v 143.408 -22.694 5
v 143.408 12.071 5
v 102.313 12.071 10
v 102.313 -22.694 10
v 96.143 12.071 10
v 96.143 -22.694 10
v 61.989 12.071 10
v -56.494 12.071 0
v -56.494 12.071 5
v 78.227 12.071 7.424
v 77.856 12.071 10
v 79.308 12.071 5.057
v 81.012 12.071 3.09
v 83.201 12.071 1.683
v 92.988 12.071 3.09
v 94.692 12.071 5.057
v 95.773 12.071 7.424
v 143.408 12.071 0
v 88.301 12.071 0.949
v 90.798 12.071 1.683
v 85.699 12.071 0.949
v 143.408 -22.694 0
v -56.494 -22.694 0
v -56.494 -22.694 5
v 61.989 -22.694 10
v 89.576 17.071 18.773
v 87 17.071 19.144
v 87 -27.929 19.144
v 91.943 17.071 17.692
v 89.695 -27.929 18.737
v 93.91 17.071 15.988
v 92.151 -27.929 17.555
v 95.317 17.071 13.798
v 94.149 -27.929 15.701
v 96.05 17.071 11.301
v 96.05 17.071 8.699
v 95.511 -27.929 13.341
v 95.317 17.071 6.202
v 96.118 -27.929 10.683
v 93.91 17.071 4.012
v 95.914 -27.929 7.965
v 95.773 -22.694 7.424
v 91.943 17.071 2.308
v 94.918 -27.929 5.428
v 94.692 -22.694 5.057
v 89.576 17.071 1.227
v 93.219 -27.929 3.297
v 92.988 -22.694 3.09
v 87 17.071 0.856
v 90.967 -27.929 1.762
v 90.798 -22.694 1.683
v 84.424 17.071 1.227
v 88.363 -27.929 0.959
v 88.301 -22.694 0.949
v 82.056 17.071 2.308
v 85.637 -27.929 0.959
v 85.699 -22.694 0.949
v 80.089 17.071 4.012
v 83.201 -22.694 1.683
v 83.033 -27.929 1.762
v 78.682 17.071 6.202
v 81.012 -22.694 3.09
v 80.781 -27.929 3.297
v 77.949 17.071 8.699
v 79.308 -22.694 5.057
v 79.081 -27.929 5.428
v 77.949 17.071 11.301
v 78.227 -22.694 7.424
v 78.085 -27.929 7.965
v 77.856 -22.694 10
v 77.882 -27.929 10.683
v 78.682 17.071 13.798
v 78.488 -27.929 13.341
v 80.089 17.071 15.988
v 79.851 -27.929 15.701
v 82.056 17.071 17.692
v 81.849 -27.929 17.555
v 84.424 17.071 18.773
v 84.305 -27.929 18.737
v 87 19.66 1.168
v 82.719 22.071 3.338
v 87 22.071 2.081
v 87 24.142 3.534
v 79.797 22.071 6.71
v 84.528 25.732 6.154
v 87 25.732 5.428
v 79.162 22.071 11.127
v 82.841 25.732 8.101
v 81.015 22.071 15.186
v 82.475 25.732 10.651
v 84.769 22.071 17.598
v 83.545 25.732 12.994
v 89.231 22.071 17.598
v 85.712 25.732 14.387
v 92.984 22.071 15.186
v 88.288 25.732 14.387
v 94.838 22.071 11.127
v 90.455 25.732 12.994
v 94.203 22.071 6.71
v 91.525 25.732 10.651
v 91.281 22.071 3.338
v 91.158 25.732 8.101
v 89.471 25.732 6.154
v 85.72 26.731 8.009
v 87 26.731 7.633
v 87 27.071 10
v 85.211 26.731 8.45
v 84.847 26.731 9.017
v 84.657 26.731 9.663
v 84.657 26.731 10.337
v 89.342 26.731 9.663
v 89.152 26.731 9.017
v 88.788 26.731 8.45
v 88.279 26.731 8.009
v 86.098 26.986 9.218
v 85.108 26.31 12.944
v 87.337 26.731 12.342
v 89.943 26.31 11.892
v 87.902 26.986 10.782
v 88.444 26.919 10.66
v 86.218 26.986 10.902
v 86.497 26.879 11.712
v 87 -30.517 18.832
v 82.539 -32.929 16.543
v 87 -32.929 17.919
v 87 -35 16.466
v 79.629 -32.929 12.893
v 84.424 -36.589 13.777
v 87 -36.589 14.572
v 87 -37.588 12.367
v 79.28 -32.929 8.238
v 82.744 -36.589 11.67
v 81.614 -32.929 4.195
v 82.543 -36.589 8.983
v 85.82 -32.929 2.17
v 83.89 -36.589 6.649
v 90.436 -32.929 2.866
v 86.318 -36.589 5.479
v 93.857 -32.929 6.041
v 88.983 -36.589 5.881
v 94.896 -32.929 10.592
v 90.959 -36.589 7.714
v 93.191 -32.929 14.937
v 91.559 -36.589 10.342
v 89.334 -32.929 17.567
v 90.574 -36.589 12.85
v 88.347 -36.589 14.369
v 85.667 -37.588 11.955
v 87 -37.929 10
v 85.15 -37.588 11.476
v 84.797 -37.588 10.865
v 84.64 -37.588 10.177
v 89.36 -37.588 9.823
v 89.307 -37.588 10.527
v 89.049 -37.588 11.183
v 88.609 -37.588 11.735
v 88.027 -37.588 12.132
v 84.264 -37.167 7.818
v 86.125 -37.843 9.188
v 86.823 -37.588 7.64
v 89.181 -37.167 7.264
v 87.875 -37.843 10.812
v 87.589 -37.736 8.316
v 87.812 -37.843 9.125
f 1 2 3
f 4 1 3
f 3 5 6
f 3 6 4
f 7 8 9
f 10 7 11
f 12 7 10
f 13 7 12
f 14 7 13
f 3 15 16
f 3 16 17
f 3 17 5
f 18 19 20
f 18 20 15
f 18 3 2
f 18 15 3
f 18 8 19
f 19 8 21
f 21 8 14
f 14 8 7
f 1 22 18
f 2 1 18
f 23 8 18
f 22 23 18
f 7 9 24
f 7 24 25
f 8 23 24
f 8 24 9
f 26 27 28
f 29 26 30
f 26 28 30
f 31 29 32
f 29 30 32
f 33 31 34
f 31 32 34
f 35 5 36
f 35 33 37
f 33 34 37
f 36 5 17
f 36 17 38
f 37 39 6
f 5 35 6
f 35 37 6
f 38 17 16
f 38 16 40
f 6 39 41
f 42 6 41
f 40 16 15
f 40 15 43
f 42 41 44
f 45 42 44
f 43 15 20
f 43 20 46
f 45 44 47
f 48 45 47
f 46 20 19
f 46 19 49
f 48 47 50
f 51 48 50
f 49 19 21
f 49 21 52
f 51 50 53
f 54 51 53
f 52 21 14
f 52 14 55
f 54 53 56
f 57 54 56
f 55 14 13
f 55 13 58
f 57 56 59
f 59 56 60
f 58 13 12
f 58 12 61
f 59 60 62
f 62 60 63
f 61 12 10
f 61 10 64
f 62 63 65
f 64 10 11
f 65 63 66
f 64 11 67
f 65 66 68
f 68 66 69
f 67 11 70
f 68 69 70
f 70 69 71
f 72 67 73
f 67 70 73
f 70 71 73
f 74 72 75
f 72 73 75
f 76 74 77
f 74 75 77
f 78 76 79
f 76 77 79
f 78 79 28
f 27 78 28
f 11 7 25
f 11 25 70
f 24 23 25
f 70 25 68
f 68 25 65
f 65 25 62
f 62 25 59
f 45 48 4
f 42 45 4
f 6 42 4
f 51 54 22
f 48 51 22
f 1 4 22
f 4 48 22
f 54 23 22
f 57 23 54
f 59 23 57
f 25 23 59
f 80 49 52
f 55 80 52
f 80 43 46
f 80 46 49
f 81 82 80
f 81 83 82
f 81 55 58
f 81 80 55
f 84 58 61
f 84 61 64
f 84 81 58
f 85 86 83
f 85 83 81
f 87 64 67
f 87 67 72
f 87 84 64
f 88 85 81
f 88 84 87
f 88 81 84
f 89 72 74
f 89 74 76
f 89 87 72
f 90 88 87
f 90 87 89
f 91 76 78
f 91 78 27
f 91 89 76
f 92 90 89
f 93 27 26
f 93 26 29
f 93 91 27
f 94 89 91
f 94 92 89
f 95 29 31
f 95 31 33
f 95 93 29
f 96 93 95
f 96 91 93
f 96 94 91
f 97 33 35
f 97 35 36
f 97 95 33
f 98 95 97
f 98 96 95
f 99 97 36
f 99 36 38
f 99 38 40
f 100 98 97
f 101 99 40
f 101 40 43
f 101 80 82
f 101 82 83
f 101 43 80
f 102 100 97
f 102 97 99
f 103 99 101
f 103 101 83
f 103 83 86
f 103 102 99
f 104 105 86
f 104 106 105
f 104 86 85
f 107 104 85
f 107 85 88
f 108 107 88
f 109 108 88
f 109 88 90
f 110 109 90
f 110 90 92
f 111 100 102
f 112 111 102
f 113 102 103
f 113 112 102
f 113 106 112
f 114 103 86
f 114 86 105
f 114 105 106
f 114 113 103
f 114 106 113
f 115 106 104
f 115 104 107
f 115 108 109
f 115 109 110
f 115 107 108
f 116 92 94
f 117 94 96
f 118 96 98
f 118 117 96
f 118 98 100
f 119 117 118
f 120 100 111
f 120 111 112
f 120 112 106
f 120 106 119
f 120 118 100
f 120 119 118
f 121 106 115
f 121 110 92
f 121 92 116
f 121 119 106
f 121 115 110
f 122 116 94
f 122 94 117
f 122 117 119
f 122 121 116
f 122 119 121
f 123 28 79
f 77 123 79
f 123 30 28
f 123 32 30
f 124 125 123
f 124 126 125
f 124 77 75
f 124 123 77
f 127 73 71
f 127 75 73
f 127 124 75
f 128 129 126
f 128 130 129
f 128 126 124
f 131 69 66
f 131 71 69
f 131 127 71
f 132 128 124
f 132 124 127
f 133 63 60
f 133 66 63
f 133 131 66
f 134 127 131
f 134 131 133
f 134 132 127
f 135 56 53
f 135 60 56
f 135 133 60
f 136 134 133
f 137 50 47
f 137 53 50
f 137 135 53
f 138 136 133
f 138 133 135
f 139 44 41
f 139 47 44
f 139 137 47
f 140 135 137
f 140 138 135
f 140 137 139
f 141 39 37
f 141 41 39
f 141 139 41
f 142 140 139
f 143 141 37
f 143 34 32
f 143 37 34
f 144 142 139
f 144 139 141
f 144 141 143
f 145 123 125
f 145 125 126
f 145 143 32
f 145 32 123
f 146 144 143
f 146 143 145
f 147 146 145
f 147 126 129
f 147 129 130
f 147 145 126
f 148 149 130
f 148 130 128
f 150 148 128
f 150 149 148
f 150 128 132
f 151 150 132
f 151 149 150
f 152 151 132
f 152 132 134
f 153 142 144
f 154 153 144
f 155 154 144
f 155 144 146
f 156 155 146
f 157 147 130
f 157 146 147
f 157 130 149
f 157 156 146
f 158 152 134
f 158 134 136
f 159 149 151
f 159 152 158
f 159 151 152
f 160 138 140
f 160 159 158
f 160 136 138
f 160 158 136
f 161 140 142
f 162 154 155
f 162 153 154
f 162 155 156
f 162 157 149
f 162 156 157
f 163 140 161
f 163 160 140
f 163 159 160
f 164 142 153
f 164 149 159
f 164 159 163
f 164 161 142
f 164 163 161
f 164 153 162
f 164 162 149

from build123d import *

# Parameters (mm, degrees)
SKETCH1_W                = 199.90213939
SKETCH1_H                = 34.765589459
BOSS_EXTRUDE1_DEPTH      = 10
BOSS_EXTRUDE2_DEPTH      = 5
BOSS_EXTRUDE2_DEPTH_BACK = 40
SKETCH2_R                = 9.143615086
DOME1_FACE_RADIUS        = 9.143615086
DOME1_HEIGHT             = 10
DOME2_FACE_RADIUS        = 9.143615086
DOME2_HEIGHT             = 10
CUT_EXTRUDE1_DEPTH       = 54


with BuildPart() as part:
    # Sketch1 → Boss-Extrude1 (new body)
    with BuildSketch(Plane.XY):
        with Locations((43.456986824, -5.3114095)):
            Rectangle(SKETCH1_W, SKETCH1_H)
    extrude(amount=BOSS_EXTRUDE1_DEPTH)

    # Sketch2 → Boss-Extrude2 (add, two sides: drawn at the far end of the back side and taken through both)
    with BuildSketch(Plane(origin=(0, 12.071385229, 0), x_dir=(1, 0, 0), z_dir=(0, 1, 0)).offset(-BOSS_EXTRUDE2_DEPTH_BACK)):
        with Locations((86.99978083, -10)):
            Circle(SKETCH2_R)
    extrude(amount=BOSS_EXTRUDE2_DEPTH + BOSS_EXTRUDE2_DEPTH_BACK)

    # Dome1: an elliptical dome of height H over a round flat face of radius A is half a spheroid: the quarter ellipse of half axes A and H revolved about the face's axis
    with BuildSketch(Plane((86.99978083, 17.071385229, 10), x_dir=(0, 0, -1), z_dir=(1, 0, 0)), mode=Mode.PRIVATE) as dome1_quarter:
        Ellipse(DOME1_FACE_RADIUS, DOME1_HEIGHT)
        Rectangle(DOME1_FACE_RADIUS, DOME1_HEIGHT, align=(Align.MIN, Align.MIN), mode=Mode.INTERSECT)
    revolve(dome1_quarter.sketch, axis=Axis((86.99978083, 17.071385229, 10), (0, 1, 0)))

    # Dome2: an elliptical dome of height H over a round flat face of radius A is half a spheroid: the quarter ellipse of half axes A and H revolved about the face's axis
    with BuildSketch(Plane((86.99978083, -27.928614771, 10), x_dir=(0, 0, 1), z_dir=(1, 0, 0)), mode=Mode.PRIVATE) as dome2_quarter:
        Ellipse(DOME2_FACE_RADIUS, DOME2_HEIGHT)
        Rectangle(DOME2_FACE_RADIUS, DOME2_HEIGHT, align=(Align.MIN, Align.MIN), mode=Mode.INTERSECT)
    revolve(dome2_quarter.sketch, axis=Axis((86.99978083, -27.928614771, 10), (0, -1, 0)))

    # Sketch3 → Cut-Extrude1 (cut)
    with BuildSketch(Plane(origin=(0, 12.071385229, 0), x_dir=(1, 0, 0), z_dir=(0, 1, 0))):
        Polygon((-56.494082871, -5), (61.988701151, -10), (-56.494082871, -10), align=None)
        Polygon((143.408056519, -5), (102.312904095, -10), (143.408056519, -10), align=None)
    extrude(amount=-CUT_EXTRUDE1_DEPTH, mode=Mode.SUBTRACT)


solid = part.part
